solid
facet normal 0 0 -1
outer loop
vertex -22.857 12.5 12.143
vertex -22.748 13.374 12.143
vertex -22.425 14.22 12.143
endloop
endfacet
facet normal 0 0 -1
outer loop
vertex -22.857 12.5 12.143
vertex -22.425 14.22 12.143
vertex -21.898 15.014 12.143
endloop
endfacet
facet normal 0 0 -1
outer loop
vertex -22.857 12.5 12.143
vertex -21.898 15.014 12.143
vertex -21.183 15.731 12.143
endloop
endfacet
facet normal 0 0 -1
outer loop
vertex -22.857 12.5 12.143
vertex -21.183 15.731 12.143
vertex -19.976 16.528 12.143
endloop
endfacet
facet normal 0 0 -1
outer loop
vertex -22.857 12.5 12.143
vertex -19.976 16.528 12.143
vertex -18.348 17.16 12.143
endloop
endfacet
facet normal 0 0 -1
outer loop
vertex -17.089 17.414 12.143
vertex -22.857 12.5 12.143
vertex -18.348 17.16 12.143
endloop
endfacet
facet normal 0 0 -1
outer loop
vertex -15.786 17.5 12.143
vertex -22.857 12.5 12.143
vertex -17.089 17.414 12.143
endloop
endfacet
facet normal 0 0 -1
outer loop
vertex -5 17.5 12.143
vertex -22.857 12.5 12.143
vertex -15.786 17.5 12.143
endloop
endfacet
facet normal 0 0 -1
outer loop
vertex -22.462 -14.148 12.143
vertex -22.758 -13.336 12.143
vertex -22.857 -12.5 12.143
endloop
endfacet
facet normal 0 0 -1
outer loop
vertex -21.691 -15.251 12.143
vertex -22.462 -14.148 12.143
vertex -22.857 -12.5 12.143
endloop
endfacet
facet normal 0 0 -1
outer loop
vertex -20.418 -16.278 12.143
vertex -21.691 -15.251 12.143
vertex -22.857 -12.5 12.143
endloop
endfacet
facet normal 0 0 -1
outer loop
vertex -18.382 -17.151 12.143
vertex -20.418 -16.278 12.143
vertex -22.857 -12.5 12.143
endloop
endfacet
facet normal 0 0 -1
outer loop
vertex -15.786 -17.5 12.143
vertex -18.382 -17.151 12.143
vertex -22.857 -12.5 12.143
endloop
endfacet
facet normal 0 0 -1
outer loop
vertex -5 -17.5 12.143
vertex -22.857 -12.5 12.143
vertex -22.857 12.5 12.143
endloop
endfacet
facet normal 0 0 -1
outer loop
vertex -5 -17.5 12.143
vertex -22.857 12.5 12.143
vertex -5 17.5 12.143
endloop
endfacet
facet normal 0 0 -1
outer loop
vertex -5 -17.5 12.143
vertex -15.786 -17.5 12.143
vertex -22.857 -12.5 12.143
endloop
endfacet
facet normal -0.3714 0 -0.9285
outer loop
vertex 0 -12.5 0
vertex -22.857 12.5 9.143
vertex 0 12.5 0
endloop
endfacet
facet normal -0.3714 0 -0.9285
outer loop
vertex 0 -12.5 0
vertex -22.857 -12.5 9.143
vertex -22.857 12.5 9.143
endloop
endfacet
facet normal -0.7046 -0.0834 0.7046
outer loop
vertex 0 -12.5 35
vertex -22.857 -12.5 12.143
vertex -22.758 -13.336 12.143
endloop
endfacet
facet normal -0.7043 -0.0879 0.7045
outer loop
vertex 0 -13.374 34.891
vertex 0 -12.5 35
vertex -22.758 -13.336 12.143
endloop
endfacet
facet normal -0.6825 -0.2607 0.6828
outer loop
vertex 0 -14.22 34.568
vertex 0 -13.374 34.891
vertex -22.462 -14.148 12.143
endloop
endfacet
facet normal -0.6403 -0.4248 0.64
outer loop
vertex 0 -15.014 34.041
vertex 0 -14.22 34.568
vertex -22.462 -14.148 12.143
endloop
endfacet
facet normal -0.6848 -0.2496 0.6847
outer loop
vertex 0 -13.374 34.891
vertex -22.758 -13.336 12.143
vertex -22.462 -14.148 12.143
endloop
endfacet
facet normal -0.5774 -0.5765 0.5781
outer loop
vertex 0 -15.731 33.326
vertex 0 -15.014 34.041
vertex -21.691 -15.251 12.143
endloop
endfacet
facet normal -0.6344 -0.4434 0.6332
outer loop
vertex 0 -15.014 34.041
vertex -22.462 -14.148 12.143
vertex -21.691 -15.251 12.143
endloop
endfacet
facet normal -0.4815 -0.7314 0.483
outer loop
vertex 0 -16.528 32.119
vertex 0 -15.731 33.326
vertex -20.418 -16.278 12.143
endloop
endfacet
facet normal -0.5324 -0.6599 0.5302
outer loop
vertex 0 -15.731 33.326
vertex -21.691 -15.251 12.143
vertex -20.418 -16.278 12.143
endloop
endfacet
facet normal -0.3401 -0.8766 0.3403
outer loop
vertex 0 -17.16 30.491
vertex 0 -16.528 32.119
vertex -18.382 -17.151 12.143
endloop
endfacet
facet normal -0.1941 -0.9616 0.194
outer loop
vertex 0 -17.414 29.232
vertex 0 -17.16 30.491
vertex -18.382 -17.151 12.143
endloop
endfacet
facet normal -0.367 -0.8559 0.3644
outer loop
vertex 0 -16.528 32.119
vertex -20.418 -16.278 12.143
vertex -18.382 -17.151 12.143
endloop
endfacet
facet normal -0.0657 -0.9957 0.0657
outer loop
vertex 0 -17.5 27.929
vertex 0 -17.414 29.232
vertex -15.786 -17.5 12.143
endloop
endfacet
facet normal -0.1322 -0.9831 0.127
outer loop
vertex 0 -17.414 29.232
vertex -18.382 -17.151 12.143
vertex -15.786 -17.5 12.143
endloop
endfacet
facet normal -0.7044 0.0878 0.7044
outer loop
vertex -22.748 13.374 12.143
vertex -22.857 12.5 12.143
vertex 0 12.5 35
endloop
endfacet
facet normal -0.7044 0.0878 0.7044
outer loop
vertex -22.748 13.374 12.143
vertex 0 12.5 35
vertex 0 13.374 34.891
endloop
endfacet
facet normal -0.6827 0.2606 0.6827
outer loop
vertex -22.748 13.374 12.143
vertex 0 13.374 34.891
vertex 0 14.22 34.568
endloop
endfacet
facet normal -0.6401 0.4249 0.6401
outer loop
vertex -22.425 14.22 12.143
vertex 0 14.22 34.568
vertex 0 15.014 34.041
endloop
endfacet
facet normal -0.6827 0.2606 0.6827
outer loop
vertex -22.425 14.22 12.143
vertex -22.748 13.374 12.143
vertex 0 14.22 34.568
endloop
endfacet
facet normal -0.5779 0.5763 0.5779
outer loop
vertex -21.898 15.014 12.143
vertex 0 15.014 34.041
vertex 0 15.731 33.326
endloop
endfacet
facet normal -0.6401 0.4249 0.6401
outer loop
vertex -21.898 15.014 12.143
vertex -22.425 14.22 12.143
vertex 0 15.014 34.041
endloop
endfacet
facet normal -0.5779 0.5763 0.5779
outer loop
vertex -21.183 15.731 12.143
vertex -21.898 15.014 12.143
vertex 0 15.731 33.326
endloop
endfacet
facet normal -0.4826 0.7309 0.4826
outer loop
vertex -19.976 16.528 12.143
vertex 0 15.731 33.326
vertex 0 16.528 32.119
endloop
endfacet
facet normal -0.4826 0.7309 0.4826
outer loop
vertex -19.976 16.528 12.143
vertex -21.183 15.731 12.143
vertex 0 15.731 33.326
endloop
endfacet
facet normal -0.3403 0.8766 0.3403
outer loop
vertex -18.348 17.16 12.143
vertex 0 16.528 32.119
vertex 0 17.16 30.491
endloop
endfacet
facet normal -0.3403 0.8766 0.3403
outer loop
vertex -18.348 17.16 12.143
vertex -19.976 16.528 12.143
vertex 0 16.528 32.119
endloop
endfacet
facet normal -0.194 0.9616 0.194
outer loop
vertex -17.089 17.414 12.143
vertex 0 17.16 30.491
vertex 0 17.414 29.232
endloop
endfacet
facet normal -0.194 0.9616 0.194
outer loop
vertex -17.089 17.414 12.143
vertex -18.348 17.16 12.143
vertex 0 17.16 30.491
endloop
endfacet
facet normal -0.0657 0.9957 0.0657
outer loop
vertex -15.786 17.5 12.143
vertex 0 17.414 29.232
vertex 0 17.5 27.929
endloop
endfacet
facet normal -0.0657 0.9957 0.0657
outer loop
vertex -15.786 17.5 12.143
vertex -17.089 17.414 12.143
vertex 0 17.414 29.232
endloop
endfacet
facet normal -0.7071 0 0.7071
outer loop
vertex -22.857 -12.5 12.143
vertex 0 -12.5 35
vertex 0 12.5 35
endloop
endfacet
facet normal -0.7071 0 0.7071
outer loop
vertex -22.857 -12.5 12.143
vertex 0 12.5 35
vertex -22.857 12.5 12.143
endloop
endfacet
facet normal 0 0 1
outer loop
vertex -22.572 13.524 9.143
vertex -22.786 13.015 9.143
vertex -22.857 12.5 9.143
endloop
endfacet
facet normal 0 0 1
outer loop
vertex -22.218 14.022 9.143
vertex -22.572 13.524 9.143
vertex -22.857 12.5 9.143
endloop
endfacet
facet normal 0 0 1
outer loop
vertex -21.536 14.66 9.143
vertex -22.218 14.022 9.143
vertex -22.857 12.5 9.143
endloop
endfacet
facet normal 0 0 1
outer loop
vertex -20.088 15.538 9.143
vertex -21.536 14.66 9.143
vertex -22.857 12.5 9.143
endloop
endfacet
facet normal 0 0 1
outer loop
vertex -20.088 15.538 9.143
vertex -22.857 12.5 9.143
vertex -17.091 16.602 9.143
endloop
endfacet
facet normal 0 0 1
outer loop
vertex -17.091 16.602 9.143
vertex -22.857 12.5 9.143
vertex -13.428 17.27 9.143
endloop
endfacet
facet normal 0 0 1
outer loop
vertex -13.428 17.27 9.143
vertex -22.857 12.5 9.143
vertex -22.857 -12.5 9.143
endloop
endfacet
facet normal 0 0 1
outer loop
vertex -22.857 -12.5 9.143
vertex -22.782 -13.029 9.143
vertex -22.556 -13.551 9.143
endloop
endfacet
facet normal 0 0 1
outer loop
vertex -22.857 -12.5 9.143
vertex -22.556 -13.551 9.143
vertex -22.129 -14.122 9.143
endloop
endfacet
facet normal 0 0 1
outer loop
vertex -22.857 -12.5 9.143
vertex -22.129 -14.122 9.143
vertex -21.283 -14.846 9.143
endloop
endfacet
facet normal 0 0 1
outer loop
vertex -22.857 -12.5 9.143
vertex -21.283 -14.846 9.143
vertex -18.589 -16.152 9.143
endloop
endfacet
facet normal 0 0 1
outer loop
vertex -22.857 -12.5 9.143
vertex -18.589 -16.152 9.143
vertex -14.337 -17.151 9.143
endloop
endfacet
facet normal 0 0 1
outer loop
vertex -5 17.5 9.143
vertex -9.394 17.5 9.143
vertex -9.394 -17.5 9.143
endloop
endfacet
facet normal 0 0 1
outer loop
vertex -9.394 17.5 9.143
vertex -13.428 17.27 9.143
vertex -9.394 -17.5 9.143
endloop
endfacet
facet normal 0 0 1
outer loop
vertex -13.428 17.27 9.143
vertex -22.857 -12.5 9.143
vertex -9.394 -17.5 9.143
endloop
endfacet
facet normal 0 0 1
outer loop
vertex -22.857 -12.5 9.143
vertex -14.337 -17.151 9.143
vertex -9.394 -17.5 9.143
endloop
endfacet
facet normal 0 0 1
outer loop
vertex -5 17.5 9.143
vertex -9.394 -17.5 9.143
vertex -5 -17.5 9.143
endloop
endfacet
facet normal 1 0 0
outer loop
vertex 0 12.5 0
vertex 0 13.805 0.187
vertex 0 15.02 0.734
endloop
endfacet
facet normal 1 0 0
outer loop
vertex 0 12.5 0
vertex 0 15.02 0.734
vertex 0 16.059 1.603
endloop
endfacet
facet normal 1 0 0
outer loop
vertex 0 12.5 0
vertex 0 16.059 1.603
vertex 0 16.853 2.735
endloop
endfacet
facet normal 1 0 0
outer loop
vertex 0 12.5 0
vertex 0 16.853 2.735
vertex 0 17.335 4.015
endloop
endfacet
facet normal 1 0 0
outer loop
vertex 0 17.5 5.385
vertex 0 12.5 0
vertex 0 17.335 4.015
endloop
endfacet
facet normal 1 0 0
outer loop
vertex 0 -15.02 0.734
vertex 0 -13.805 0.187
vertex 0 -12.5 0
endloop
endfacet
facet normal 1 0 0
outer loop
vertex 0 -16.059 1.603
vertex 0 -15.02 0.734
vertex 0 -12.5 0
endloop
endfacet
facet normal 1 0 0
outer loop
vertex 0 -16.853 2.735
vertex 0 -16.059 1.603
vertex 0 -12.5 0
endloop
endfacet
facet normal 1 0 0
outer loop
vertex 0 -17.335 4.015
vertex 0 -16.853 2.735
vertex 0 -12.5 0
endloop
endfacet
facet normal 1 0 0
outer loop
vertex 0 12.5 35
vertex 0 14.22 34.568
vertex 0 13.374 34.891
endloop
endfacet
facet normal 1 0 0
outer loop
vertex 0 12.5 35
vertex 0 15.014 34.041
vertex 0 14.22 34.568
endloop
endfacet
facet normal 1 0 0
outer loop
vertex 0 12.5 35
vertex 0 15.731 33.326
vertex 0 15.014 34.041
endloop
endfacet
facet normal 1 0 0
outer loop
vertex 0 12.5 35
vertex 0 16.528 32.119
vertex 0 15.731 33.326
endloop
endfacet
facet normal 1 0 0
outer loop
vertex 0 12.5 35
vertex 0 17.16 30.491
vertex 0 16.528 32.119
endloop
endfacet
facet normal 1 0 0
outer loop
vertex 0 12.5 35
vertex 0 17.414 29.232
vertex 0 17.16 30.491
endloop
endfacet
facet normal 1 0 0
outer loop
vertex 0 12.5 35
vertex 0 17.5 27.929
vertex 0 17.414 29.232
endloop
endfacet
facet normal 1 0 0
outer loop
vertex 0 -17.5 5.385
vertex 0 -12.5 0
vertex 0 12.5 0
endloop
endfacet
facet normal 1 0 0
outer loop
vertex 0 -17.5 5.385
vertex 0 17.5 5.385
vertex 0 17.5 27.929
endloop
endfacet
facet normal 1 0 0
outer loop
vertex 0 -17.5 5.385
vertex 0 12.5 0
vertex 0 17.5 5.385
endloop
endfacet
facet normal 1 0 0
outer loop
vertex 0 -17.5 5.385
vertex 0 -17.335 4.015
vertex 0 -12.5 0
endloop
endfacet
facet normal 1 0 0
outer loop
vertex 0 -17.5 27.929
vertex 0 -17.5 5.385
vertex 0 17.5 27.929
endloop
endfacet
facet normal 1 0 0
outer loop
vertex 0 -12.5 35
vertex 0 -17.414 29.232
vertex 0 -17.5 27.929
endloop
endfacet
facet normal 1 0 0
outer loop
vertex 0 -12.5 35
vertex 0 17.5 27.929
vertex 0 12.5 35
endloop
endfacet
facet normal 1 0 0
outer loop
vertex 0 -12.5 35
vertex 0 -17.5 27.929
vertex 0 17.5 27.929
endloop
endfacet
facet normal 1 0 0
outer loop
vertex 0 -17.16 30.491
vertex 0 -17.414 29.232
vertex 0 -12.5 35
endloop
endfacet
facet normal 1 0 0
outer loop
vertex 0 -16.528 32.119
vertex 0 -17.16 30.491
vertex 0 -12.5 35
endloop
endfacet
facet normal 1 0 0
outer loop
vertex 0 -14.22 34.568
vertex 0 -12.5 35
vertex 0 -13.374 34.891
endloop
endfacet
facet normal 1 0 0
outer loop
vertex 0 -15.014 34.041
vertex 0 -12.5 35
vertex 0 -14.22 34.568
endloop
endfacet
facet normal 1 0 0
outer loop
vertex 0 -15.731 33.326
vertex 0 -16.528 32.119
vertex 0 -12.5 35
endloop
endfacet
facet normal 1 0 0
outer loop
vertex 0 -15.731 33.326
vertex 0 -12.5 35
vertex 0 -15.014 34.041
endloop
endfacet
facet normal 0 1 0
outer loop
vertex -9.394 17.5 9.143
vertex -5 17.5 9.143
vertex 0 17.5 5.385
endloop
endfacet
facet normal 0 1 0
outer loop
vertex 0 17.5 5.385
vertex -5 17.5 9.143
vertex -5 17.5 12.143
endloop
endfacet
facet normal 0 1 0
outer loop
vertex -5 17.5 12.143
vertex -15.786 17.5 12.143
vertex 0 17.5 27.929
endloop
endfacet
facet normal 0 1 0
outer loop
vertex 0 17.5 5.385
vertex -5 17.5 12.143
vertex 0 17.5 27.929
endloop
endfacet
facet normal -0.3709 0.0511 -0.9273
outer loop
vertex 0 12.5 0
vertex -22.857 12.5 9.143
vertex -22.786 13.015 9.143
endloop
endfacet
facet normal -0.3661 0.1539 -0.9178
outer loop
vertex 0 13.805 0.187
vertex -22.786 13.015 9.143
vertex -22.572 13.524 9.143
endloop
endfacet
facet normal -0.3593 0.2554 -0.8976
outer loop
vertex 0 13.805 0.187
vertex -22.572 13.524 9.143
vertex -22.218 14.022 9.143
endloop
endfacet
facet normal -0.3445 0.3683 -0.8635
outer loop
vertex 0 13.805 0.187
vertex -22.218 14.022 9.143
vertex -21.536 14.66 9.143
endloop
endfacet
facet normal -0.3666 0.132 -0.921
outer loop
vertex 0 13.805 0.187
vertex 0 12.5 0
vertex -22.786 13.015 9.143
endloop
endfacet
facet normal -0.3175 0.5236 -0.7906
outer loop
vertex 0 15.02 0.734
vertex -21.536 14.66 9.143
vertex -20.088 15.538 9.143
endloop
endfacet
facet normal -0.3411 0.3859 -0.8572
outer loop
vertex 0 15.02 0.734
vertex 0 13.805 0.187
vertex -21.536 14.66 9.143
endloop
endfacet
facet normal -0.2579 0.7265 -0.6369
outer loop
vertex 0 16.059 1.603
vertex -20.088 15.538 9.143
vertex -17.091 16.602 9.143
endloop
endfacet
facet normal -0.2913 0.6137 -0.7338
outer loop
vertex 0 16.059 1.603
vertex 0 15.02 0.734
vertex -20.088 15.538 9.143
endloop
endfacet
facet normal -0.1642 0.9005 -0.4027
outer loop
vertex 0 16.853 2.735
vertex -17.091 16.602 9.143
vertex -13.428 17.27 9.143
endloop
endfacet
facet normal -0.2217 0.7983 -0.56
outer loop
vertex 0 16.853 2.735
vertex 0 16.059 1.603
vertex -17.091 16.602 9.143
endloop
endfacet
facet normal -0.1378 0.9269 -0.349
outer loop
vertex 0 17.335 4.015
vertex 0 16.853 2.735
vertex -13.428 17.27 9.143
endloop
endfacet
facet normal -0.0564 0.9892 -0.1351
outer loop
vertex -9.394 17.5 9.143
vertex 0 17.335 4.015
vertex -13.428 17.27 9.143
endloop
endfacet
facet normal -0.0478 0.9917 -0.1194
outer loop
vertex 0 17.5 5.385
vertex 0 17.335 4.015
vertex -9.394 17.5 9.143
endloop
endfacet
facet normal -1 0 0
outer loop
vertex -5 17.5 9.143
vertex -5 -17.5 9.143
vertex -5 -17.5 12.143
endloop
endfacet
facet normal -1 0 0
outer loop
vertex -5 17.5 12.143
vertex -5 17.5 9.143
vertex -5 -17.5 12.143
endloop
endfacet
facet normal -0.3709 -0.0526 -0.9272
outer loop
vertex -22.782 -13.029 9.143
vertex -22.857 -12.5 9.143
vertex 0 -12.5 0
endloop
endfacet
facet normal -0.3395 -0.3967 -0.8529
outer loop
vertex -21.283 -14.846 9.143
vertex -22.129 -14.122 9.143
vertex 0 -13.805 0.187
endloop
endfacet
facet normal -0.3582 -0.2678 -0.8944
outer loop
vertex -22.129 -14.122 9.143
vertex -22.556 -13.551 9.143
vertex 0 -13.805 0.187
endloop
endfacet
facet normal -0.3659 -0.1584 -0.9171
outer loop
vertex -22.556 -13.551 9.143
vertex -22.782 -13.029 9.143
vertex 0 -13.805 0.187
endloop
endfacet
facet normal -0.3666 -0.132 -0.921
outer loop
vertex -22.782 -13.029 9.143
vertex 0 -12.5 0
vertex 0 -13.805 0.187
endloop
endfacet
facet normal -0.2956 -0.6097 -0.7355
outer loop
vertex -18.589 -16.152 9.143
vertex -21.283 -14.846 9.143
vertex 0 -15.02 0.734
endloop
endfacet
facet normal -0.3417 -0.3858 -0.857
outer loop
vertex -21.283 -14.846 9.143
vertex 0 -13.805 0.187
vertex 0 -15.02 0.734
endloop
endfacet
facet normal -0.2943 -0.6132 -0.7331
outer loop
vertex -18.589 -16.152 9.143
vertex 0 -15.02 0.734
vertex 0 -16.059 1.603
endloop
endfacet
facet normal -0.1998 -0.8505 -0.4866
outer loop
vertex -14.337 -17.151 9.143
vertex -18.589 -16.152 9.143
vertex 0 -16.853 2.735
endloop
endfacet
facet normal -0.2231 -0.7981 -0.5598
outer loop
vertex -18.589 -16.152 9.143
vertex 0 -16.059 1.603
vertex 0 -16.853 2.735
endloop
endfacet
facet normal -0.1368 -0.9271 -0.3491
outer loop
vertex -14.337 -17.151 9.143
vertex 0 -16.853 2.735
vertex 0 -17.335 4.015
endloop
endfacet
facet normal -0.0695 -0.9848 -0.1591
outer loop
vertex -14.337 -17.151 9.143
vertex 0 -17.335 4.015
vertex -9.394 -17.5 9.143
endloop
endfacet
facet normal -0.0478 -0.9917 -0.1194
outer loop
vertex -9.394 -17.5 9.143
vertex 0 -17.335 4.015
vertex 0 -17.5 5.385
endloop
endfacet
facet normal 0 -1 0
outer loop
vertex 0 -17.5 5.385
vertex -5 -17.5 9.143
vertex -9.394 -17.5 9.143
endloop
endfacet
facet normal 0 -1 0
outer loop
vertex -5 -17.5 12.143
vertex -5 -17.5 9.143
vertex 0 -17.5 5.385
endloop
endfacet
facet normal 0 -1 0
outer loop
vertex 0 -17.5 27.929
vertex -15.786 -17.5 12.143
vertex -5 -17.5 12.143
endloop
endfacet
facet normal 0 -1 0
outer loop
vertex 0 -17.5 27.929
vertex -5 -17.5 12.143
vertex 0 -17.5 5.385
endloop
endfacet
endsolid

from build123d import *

# Parameters (mm, degrees)
F1_DEPTH = 17.5
F2_R     = 5
F3_W     = 40
F3_H     = 3
F4_DEPTH = 20


with BuildPart() as f1:
    # F0 (on Front) → F1 (new body, symmetric)
    with BuildSketch(Plane.XZ):
        Polygon((-25, 10), (0, 0), (0, 35), align=None)
    extrude(amount=F1_DEPTH, both=True)

    # F2
    f2_edges = [f1.edges().sort_by_distance(p)[0] for p in [
        (-12.5, -17.5, 22.5),
        (-12.5, -17.5, 5),
        (-12.5, 17.5, 22.5),
        (-12.5, 17.5, 5),
    ]]
    fillet(f2_edges, radius=F2_R)

    # F3 (on Front) → F4 (cut, symmetric)
    with BuildSketch(Plane.XZ):
        with Locations((-25, 10.642857)):
            Rectangle(F3_W, F3_H)
    extrude(amount=F4_DEPTH, both=True, mode=Mode.SUBTRACT)


solid = f1.part
